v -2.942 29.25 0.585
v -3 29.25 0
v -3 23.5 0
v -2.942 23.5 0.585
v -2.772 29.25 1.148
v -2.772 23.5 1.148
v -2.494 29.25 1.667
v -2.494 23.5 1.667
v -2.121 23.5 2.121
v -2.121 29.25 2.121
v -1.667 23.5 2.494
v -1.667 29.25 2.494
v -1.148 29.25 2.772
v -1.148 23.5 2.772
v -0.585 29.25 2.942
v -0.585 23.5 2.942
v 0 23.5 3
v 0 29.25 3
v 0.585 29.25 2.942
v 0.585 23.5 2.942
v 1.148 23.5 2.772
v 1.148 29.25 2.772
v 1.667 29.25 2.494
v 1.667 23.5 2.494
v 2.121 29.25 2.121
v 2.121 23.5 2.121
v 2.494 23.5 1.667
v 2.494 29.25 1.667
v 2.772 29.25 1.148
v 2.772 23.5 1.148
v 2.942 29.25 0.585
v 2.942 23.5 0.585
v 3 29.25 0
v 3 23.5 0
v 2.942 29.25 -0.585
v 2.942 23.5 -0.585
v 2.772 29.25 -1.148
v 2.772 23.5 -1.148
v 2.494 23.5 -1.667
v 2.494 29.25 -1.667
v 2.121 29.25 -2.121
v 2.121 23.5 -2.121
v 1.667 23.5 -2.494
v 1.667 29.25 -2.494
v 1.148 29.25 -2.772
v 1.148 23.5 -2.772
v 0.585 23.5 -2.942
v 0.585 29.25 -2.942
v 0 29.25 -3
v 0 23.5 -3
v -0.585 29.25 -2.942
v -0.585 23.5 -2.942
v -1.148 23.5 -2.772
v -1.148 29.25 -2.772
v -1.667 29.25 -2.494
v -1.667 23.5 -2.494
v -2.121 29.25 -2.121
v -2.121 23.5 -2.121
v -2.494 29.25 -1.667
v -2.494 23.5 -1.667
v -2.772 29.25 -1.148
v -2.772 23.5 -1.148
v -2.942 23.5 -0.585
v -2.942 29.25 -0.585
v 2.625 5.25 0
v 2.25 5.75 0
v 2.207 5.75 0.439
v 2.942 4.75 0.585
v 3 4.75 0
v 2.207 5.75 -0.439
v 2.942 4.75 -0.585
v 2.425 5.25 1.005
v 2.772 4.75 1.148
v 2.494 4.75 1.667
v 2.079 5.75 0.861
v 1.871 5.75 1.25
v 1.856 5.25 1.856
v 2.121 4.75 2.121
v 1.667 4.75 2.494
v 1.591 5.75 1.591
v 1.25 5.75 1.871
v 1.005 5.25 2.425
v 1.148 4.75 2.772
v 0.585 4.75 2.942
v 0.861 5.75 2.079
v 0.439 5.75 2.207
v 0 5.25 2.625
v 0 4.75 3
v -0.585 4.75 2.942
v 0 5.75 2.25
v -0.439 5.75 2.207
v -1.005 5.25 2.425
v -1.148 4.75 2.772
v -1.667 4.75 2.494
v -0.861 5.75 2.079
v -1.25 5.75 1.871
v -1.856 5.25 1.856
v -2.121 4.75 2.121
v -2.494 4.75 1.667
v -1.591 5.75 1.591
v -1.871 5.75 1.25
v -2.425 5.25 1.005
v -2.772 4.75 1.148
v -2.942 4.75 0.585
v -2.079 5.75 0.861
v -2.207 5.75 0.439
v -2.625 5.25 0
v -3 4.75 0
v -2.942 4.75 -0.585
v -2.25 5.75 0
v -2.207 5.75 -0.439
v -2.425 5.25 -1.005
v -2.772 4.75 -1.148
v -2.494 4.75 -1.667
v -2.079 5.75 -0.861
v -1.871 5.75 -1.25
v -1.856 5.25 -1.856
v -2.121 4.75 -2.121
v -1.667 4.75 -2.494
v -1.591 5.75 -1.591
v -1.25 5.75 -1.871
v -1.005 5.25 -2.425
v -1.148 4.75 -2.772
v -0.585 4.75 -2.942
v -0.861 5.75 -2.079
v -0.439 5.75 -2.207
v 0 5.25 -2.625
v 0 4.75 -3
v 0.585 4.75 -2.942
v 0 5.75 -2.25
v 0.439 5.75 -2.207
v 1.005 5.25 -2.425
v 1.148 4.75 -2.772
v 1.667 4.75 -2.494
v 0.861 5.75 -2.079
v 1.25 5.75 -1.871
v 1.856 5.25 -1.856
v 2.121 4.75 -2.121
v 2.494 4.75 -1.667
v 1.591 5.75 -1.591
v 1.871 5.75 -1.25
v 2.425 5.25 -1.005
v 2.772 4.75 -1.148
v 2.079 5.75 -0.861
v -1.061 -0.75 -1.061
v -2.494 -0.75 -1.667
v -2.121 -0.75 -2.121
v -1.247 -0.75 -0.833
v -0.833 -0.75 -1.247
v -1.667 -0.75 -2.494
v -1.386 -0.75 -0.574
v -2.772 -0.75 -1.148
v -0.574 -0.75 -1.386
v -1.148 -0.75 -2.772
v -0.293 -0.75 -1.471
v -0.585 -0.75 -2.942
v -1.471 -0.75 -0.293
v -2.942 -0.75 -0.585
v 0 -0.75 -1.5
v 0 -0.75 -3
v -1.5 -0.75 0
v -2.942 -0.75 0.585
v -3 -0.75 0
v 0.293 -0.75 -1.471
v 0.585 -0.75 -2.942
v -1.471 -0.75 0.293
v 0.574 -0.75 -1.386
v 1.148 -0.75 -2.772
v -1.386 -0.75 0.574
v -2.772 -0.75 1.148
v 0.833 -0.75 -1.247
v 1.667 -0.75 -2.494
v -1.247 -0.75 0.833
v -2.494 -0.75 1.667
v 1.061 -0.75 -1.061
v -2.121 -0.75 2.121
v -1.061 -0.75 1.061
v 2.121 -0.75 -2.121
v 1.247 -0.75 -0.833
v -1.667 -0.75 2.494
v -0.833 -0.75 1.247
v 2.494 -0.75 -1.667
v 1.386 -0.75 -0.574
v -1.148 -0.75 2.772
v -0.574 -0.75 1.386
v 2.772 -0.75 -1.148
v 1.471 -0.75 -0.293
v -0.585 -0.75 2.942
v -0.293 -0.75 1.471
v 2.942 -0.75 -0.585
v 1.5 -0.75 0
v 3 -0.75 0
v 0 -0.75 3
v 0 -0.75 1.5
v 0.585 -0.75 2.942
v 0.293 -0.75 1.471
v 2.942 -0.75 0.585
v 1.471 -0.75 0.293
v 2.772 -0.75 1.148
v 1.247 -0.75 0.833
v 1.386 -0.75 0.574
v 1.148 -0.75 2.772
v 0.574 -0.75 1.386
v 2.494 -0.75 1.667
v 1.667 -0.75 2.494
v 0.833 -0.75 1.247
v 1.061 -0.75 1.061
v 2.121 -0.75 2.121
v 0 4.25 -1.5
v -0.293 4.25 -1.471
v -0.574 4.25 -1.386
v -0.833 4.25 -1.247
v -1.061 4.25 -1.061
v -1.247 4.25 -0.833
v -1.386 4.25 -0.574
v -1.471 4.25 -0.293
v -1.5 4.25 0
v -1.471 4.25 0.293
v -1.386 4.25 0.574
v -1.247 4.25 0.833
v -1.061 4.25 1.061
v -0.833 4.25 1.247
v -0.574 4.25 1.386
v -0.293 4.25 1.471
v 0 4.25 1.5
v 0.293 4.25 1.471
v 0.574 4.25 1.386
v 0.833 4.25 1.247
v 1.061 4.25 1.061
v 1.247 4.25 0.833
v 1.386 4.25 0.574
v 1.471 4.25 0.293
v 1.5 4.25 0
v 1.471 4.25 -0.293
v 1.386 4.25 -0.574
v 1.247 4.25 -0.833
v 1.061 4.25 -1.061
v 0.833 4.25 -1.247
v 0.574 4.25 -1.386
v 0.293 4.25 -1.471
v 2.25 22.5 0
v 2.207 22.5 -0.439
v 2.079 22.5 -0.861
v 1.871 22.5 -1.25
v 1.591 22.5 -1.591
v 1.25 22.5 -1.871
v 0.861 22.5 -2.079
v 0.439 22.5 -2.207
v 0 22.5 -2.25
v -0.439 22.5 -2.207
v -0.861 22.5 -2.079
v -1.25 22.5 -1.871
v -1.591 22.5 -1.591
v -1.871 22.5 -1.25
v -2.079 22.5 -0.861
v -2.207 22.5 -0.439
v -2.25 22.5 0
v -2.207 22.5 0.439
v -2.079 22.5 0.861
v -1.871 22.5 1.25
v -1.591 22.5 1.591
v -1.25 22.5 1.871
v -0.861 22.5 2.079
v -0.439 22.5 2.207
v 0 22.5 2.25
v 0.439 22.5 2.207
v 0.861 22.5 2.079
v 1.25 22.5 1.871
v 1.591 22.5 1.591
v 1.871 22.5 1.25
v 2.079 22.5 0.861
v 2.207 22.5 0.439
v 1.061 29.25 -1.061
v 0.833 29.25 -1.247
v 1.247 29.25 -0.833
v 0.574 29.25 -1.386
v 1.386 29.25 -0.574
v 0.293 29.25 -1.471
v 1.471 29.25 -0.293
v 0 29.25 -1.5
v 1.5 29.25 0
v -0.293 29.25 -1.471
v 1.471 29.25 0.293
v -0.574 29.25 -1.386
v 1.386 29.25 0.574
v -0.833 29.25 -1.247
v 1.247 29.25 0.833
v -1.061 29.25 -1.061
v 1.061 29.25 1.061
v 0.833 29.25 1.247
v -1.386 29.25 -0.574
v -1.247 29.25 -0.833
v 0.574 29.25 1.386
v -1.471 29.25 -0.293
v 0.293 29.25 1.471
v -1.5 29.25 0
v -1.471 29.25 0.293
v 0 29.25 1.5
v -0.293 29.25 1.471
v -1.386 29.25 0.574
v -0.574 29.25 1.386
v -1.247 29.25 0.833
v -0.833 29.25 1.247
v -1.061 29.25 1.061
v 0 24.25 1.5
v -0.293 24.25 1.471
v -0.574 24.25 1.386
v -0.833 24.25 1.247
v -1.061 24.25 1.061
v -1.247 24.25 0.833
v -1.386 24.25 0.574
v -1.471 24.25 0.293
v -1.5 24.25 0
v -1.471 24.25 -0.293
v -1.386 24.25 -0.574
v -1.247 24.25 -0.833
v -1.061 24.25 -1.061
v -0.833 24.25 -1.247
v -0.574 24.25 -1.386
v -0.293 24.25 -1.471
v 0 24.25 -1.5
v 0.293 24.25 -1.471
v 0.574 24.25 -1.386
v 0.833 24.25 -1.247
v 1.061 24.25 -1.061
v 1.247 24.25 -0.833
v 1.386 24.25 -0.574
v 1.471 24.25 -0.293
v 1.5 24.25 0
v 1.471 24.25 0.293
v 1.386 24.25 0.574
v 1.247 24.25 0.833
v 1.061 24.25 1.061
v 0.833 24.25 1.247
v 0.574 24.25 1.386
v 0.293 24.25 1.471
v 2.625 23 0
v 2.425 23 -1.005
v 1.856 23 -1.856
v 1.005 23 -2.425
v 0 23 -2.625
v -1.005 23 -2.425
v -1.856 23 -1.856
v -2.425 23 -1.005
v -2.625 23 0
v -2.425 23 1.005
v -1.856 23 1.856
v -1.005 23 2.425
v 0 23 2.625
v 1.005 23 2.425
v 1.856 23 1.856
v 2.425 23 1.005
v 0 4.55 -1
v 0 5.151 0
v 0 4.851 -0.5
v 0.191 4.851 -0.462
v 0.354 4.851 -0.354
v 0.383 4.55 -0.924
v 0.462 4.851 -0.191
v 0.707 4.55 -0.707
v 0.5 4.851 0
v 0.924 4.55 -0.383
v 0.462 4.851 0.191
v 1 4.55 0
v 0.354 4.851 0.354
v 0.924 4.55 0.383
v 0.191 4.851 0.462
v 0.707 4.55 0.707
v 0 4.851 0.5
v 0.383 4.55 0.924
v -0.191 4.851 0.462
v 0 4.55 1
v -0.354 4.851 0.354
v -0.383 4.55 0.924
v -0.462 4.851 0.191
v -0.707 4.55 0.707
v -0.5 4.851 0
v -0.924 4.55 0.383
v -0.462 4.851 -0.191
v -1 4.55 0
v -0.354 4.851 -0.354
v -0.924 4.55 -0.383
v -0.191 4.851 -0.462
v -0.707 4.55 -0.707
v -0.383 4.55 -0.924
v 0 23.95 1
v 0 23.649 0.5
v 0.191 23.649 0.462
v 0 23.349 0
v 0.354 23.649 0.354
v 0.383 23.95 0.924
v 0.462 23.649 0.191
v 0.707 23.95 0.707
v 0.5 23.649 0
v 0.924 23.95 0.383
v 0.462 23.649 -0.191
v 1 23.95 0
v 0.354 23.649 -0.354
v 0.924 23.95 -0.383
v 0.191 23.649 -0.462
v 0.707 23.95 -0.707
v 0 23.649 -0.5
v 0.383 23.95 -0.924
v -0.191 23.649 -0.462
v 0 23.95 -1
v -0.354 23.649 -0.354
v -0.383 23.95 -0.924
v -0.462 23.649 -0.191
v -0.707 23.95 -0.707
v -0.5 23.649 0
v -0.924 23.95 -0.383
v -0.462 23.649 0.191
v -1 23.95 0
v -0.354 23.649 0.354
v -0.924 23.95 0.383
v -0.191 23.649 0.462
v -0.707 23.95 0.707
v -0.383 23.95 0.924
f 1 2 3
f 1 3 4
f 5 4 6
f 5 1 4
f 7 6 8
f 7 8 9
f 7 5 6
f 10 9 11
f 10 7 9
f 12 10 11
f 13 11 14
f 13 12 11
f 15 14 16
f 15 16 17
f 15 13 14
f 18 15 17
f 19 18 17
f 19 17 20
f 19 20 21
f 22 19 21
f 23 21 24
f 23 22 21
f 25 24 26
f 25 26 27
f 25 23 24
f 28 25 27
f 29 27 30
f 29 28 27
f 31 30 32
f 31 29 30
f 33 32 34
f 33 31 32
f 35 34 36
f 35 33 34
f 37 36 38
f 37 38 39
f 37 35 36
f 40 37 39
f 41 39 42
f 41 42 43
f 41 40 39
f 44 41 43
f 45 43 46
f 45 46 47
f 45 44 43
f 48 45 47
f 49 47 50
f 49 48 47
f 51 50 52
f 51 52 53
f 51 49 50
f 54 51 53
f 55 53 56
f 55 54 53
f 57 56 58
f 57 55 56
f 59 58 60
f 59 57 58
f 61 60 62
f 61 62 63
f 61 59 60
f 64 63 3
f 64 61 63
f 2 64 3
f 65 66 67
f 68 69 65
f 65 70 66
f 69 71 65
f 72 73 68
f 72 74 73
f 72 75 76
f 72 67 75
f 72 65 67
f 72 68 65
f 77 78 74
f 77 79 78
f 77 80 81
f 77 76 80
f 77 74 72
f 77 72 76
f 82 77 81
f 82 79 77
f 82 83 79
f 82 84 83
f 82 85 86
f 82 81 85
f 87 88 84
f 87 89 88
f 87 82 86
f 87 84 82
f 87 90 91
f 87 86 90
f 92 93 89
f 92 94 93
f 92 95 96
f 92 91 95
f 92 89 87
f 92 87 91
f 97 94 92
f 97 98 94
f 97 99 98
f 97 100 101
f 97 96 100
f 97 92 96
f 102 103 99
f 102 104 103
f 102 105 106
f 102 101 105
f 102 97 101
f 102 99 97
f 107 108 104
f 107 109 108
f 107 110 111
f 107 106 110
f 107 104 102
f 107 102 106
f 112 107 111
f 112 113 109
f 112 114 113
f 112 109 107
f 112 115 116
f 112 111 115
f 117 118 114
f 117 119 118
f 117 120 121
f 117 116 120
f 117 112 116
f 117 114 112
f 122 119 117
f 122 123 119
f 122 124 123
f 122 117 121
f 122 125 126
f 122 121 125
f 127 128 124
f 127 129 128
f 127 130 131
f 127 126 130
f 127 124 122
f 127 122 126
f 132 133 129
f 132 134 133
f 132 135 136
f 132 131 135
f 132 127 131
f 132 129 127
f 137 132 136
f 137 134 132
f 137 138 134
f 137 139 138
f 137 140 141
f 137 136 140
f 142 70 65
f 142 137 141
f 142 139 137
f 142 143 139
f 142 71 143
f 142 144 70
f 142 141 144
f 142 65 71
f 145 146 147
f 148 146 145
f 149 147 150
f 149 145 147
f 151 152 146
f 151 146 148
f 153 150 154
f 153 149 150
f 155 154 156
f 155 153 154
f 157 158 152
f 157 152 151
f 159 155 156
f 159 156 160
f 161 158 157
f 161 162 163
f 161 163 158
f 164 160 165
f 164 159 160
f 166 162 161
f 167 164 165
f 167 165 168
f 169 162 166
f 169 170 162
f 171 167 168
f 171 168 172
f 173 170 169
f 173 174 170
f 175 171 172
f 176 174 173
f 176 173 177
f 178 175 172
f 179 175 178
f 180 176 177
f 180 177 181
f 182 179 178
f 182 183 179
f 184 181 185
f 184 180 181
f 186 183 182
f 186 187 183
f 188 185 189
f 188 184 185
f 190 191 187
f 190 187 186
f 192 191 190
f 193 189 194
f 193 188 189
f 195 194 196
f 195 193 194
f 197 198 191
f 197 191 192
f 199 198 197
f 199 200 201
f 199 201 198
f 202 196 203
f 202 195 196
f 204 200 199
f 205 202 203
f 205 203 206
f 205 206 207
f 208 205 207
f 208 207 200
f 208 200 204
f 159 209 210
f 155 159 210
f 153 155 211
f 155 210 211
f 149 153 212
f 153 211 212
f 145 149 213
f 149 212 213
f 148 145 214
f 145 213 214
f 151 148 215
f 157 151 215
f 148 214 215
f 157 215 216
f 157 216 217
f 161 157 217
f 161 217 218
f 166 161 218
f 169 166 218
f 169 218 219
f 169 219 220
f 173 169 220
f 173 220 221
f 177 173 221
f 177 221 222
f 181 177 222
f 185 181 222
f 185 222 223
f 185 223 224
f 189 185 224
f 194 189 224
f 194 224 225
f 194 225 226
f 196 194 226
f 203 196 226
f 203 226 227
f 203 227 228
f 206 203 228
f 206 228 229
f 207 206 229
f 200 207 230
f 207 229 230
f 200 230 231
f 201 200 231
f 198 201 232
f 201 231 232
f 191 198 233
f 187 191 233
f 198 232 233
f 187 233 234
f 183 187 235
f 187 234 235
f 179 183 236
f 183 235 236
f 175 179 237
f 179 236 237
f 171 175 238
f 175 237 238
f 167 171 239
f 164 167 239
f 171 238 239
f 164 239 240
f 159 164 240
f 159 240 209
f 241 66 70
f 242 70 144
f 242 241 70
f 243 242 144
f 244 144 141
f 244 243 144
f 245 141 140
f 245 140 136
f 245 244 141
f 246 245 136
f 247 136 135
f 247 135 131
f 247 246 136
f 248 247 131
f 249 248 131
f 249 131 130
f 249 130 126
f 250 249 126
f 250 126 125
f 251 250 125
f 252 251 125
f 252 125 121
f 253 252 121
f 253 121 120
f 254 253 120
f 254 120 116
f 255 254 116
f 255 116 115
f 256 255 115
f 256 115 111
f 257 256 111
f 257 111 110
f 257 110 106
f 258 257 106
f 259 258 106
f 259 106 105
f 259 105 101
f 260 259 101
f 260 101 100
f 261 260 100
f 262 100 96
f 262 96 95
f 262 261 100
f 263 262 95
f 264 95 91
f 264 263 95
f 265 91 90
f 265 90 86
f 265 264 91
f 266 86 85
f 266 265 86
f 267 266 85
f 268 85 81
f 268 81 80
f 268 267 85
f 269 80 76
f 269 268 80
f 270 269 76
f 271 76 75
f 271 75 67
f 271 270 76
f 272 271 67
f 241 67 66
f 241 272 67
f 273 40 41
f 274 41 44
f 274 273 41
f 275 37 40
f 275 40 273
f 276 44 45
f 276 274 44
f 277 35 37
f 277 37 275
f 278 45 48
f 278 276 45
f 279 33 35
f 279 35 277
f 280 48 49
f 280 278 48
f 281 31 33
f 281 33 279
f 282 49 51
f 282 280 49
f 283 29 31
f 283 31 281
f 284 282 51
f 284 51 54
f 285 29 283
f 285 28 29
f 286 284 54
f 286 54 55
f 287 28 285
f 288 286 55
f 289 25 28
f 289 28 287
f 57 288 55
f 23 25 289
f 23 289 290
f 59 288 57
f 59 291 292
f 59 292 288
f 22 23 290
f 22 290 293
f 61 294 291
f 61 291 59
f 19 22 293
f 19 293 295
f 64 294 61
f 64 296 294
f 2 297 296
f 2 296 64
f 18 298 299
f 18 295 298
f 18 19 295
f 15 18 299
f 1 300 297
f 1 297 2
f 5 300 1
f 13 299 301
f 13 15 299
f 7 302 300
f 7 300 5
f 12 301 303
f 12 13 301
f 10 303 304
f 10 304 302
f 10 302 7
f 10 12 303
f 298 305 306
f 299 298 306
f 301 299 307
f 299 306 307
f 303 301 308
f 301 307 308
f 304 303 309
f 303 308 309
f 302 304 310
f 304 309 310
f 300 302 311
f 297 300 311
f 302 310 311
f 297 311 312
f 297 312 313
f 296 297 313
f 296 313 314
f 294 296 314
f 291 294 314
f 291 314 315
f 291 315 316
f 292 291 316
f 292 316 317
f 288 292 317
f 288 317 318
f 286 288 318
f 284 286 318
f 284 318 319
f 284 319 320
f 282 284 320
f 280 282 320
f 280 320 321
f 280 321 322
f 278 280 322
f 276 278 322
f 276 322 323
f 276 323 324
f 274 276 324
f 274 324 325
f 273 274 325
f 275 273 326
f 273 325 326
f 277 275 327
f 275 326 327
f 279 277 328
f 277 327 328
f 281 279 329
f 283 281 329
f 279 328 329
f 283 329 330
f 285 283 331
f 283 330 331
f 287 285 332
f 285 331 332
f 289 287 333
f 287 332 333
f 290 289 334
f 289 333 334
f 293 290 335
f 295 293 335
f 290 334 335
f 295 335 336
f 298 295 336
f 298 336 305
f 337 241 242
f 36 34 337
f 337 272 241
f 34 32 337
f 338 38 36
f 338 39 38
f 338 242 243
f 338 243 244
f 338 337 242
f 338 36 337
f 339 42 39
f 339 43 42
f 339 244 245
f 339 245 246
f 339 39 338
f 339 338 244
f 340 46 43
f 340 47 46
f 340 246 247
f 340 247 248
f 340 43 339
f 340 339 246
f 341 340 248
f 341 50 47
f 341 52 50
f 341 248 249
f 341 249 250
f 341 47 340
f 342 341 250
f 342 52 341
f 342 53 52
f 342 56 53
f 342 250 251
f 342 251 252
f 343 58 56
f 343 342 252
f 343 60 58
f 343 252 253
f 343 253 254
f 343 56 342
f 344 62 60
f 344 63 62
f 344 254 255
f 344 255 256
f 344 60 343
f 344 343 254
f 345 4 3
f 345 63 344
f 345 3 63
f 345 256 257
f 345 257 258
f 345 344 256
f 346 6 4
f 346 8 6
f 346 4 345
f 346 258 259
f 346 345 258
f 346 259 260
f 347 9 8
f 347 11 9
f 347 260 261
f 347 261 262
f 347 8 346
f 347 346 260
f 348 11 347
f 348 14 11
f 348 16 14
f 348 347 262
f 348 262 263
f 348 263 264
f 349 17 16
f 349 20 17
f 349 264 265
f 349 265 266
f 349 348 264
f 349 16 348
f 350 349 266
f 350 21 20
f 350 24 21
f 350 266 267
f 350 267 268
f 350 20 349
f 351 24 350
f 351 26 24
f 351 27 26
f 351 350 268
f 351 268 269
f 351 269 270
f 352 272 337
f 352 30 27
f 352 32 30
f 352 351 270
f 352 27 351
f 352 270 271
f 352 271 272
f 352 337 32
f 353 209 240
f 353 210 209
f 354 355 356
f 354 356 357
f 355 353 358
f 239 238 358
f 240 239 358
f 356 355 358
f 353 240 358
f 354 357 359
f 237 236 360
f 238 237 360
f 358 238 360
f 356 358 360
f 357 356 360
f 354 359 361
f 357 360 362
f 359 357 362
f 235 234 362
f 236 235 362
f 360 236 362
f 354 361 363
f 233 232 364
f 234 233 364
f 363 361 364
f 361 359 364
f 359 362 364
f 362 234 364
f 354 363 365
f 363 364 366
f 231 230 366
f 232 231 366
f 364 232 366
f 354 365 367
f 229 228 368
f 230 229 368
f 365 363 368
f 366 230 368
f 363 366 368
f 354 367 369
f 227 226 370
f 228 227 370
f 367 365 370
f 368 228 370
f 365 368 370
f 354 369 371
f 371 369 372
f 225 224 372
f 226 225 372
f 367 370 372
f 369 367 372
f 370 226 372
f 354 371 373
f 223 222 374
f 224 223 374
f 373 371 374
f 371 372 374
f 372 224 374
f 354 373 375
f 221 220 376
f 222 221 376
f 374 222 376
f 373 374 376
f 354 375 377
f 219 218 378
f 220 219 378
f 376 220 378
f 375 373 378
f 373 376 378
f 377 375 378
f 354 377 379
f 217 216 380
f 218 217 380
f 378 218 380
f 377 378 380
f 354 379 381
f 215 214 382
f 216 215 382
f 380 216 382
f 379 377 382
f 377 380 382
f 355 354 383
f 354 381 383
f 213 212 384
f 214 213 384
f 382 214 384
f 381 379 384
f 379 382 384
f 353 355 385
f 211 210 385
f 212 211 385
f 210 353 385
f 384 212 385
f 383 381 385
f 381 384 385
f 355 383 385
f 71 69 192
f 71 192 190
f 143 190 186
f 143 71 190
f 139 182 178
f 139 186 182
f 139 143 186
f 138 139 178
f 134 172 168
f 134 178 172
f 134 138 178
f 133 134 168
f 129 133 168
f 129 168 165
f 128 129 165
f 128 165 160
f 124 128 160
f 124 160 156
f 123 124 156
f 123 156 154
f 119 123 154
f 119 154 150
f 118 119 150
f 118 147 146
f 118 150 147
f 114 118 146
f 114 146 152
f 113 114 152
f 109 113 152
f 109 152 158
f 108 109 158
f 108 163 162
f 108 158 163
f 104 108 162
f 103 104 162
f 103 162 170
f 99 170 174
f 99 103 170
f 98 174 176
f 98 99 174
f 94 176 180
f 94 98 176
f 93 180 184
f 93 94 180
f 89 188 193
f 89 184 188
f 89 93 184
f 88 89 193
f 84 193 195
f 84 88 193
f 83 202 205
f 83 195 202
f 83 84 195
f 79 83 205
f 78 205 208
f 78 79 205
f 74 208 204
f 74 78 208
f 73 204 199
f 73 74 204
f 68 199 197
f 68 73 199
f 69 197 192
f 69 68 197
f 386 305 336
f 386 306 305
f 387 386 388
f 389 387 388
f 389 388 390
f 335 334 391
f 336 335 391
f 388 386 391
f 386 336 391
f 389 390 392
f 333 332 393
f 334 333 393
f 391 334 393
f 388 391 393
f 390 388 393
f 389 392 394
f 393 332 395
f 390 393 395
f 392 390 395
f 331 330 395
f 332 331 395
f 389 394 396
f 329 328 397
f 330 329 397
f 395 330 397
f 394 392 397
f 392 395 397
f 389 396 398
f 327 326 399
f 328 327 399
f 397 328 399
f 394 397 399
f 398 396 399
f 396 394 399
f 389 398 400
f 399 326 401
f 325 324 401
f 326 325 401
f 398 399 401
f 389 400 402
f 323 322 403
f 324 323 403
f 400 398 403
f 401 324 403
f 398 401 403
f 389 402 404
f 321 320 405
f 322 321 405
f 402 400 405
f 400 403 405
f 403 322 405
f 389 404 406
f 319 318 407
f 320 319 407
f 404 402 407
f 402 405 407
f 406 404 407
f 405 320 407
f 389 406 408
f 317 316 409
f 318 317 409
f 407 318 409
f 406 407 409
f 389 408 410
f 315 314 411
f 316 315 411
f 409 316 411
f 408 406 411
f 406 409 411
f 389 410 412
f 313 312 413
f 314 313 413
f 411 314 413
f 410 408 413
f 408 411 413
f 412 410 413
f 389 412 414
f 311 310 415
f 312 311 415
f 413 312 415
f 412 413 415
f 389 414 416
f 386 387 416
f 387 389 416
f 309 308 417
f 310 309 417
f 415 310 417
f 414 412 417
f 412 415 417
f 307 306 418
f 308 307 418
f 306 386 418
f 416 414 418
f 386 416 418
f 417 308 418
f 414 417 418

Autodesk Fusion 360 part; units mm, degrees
sketch "Sketch2" plane through (0, 30, 0) normal (0, 1, 0) x (-1, 0, 0)
  circle A0 centre (0, 0) radius 3
  circle A1 centre (0, 0) radius 3
ref_plane "WorkPlane1" through (0, 23.5, 0) normal (0, 1, 0) x (-1, 0, 0)
ref_plane "WorkPlane2" through (0, 22.5, 0) normal (0, 1, 0) x (-1, 0, 0)
sketch "Sketch3" plane through (0, 22.5, 0) normal (0, 1, 0) x (1, 0, 0)
  circle A0 centre (0, 0) radius 2.25
  dimension "d12" = 4.5
sketch "Sketch4" plane through (0, 23.5, 0) normal (0, 1, 0) x (1, 0, 0)
  circle A0 centre (0, 0) radius 3
  dimension "d13" = 6
extrude "Extrude2" add sketch "Sketch2" against normal blind 6.5
loft "Loft1" add profiles "Sketch4", "Sketch3" section 1 section 2
extrude "Extrude3" add 1 faces at (-0.1619, 22.5, 0.6982) along direction (0, -1, 0) blind 16.75
ref_plane "WorkPlane3" through (0, 4.75, 0) normal (0, -1, 0) x (0, 0, -1)
sketch "Sketch5" plane through (0, 4.75, 0) normal (0, -1, 0) x (1, 0, 0)
  circle A0 centre (0, 0) radius 3
  dimension "d19" = 6
loft "Loft2" add profiles "Sketch5" section 1 face at (-0.1619, 5.75, 0.6982) section 2
extrude "Extrude4" add 1 faces at (-1.1591, 4.75, 0.5829) along direction (0, -1, 0) blind 5.5
extrude "Extrude5" cut 1 faces at (1.1591, 30, 0.5829) along direction (0, -1, 0) blind 0.75
hole "Hole3" at (0, 29.25, 0) direction (0, -1, 0) diameter 3 depth 5 tip angle 118
hole "Hole4" at (0, -0.75, 0) direction (0, 1, 0) diameter 3 depth 5 tip angle 118
thread "Thread3"
thread "Thread4"
